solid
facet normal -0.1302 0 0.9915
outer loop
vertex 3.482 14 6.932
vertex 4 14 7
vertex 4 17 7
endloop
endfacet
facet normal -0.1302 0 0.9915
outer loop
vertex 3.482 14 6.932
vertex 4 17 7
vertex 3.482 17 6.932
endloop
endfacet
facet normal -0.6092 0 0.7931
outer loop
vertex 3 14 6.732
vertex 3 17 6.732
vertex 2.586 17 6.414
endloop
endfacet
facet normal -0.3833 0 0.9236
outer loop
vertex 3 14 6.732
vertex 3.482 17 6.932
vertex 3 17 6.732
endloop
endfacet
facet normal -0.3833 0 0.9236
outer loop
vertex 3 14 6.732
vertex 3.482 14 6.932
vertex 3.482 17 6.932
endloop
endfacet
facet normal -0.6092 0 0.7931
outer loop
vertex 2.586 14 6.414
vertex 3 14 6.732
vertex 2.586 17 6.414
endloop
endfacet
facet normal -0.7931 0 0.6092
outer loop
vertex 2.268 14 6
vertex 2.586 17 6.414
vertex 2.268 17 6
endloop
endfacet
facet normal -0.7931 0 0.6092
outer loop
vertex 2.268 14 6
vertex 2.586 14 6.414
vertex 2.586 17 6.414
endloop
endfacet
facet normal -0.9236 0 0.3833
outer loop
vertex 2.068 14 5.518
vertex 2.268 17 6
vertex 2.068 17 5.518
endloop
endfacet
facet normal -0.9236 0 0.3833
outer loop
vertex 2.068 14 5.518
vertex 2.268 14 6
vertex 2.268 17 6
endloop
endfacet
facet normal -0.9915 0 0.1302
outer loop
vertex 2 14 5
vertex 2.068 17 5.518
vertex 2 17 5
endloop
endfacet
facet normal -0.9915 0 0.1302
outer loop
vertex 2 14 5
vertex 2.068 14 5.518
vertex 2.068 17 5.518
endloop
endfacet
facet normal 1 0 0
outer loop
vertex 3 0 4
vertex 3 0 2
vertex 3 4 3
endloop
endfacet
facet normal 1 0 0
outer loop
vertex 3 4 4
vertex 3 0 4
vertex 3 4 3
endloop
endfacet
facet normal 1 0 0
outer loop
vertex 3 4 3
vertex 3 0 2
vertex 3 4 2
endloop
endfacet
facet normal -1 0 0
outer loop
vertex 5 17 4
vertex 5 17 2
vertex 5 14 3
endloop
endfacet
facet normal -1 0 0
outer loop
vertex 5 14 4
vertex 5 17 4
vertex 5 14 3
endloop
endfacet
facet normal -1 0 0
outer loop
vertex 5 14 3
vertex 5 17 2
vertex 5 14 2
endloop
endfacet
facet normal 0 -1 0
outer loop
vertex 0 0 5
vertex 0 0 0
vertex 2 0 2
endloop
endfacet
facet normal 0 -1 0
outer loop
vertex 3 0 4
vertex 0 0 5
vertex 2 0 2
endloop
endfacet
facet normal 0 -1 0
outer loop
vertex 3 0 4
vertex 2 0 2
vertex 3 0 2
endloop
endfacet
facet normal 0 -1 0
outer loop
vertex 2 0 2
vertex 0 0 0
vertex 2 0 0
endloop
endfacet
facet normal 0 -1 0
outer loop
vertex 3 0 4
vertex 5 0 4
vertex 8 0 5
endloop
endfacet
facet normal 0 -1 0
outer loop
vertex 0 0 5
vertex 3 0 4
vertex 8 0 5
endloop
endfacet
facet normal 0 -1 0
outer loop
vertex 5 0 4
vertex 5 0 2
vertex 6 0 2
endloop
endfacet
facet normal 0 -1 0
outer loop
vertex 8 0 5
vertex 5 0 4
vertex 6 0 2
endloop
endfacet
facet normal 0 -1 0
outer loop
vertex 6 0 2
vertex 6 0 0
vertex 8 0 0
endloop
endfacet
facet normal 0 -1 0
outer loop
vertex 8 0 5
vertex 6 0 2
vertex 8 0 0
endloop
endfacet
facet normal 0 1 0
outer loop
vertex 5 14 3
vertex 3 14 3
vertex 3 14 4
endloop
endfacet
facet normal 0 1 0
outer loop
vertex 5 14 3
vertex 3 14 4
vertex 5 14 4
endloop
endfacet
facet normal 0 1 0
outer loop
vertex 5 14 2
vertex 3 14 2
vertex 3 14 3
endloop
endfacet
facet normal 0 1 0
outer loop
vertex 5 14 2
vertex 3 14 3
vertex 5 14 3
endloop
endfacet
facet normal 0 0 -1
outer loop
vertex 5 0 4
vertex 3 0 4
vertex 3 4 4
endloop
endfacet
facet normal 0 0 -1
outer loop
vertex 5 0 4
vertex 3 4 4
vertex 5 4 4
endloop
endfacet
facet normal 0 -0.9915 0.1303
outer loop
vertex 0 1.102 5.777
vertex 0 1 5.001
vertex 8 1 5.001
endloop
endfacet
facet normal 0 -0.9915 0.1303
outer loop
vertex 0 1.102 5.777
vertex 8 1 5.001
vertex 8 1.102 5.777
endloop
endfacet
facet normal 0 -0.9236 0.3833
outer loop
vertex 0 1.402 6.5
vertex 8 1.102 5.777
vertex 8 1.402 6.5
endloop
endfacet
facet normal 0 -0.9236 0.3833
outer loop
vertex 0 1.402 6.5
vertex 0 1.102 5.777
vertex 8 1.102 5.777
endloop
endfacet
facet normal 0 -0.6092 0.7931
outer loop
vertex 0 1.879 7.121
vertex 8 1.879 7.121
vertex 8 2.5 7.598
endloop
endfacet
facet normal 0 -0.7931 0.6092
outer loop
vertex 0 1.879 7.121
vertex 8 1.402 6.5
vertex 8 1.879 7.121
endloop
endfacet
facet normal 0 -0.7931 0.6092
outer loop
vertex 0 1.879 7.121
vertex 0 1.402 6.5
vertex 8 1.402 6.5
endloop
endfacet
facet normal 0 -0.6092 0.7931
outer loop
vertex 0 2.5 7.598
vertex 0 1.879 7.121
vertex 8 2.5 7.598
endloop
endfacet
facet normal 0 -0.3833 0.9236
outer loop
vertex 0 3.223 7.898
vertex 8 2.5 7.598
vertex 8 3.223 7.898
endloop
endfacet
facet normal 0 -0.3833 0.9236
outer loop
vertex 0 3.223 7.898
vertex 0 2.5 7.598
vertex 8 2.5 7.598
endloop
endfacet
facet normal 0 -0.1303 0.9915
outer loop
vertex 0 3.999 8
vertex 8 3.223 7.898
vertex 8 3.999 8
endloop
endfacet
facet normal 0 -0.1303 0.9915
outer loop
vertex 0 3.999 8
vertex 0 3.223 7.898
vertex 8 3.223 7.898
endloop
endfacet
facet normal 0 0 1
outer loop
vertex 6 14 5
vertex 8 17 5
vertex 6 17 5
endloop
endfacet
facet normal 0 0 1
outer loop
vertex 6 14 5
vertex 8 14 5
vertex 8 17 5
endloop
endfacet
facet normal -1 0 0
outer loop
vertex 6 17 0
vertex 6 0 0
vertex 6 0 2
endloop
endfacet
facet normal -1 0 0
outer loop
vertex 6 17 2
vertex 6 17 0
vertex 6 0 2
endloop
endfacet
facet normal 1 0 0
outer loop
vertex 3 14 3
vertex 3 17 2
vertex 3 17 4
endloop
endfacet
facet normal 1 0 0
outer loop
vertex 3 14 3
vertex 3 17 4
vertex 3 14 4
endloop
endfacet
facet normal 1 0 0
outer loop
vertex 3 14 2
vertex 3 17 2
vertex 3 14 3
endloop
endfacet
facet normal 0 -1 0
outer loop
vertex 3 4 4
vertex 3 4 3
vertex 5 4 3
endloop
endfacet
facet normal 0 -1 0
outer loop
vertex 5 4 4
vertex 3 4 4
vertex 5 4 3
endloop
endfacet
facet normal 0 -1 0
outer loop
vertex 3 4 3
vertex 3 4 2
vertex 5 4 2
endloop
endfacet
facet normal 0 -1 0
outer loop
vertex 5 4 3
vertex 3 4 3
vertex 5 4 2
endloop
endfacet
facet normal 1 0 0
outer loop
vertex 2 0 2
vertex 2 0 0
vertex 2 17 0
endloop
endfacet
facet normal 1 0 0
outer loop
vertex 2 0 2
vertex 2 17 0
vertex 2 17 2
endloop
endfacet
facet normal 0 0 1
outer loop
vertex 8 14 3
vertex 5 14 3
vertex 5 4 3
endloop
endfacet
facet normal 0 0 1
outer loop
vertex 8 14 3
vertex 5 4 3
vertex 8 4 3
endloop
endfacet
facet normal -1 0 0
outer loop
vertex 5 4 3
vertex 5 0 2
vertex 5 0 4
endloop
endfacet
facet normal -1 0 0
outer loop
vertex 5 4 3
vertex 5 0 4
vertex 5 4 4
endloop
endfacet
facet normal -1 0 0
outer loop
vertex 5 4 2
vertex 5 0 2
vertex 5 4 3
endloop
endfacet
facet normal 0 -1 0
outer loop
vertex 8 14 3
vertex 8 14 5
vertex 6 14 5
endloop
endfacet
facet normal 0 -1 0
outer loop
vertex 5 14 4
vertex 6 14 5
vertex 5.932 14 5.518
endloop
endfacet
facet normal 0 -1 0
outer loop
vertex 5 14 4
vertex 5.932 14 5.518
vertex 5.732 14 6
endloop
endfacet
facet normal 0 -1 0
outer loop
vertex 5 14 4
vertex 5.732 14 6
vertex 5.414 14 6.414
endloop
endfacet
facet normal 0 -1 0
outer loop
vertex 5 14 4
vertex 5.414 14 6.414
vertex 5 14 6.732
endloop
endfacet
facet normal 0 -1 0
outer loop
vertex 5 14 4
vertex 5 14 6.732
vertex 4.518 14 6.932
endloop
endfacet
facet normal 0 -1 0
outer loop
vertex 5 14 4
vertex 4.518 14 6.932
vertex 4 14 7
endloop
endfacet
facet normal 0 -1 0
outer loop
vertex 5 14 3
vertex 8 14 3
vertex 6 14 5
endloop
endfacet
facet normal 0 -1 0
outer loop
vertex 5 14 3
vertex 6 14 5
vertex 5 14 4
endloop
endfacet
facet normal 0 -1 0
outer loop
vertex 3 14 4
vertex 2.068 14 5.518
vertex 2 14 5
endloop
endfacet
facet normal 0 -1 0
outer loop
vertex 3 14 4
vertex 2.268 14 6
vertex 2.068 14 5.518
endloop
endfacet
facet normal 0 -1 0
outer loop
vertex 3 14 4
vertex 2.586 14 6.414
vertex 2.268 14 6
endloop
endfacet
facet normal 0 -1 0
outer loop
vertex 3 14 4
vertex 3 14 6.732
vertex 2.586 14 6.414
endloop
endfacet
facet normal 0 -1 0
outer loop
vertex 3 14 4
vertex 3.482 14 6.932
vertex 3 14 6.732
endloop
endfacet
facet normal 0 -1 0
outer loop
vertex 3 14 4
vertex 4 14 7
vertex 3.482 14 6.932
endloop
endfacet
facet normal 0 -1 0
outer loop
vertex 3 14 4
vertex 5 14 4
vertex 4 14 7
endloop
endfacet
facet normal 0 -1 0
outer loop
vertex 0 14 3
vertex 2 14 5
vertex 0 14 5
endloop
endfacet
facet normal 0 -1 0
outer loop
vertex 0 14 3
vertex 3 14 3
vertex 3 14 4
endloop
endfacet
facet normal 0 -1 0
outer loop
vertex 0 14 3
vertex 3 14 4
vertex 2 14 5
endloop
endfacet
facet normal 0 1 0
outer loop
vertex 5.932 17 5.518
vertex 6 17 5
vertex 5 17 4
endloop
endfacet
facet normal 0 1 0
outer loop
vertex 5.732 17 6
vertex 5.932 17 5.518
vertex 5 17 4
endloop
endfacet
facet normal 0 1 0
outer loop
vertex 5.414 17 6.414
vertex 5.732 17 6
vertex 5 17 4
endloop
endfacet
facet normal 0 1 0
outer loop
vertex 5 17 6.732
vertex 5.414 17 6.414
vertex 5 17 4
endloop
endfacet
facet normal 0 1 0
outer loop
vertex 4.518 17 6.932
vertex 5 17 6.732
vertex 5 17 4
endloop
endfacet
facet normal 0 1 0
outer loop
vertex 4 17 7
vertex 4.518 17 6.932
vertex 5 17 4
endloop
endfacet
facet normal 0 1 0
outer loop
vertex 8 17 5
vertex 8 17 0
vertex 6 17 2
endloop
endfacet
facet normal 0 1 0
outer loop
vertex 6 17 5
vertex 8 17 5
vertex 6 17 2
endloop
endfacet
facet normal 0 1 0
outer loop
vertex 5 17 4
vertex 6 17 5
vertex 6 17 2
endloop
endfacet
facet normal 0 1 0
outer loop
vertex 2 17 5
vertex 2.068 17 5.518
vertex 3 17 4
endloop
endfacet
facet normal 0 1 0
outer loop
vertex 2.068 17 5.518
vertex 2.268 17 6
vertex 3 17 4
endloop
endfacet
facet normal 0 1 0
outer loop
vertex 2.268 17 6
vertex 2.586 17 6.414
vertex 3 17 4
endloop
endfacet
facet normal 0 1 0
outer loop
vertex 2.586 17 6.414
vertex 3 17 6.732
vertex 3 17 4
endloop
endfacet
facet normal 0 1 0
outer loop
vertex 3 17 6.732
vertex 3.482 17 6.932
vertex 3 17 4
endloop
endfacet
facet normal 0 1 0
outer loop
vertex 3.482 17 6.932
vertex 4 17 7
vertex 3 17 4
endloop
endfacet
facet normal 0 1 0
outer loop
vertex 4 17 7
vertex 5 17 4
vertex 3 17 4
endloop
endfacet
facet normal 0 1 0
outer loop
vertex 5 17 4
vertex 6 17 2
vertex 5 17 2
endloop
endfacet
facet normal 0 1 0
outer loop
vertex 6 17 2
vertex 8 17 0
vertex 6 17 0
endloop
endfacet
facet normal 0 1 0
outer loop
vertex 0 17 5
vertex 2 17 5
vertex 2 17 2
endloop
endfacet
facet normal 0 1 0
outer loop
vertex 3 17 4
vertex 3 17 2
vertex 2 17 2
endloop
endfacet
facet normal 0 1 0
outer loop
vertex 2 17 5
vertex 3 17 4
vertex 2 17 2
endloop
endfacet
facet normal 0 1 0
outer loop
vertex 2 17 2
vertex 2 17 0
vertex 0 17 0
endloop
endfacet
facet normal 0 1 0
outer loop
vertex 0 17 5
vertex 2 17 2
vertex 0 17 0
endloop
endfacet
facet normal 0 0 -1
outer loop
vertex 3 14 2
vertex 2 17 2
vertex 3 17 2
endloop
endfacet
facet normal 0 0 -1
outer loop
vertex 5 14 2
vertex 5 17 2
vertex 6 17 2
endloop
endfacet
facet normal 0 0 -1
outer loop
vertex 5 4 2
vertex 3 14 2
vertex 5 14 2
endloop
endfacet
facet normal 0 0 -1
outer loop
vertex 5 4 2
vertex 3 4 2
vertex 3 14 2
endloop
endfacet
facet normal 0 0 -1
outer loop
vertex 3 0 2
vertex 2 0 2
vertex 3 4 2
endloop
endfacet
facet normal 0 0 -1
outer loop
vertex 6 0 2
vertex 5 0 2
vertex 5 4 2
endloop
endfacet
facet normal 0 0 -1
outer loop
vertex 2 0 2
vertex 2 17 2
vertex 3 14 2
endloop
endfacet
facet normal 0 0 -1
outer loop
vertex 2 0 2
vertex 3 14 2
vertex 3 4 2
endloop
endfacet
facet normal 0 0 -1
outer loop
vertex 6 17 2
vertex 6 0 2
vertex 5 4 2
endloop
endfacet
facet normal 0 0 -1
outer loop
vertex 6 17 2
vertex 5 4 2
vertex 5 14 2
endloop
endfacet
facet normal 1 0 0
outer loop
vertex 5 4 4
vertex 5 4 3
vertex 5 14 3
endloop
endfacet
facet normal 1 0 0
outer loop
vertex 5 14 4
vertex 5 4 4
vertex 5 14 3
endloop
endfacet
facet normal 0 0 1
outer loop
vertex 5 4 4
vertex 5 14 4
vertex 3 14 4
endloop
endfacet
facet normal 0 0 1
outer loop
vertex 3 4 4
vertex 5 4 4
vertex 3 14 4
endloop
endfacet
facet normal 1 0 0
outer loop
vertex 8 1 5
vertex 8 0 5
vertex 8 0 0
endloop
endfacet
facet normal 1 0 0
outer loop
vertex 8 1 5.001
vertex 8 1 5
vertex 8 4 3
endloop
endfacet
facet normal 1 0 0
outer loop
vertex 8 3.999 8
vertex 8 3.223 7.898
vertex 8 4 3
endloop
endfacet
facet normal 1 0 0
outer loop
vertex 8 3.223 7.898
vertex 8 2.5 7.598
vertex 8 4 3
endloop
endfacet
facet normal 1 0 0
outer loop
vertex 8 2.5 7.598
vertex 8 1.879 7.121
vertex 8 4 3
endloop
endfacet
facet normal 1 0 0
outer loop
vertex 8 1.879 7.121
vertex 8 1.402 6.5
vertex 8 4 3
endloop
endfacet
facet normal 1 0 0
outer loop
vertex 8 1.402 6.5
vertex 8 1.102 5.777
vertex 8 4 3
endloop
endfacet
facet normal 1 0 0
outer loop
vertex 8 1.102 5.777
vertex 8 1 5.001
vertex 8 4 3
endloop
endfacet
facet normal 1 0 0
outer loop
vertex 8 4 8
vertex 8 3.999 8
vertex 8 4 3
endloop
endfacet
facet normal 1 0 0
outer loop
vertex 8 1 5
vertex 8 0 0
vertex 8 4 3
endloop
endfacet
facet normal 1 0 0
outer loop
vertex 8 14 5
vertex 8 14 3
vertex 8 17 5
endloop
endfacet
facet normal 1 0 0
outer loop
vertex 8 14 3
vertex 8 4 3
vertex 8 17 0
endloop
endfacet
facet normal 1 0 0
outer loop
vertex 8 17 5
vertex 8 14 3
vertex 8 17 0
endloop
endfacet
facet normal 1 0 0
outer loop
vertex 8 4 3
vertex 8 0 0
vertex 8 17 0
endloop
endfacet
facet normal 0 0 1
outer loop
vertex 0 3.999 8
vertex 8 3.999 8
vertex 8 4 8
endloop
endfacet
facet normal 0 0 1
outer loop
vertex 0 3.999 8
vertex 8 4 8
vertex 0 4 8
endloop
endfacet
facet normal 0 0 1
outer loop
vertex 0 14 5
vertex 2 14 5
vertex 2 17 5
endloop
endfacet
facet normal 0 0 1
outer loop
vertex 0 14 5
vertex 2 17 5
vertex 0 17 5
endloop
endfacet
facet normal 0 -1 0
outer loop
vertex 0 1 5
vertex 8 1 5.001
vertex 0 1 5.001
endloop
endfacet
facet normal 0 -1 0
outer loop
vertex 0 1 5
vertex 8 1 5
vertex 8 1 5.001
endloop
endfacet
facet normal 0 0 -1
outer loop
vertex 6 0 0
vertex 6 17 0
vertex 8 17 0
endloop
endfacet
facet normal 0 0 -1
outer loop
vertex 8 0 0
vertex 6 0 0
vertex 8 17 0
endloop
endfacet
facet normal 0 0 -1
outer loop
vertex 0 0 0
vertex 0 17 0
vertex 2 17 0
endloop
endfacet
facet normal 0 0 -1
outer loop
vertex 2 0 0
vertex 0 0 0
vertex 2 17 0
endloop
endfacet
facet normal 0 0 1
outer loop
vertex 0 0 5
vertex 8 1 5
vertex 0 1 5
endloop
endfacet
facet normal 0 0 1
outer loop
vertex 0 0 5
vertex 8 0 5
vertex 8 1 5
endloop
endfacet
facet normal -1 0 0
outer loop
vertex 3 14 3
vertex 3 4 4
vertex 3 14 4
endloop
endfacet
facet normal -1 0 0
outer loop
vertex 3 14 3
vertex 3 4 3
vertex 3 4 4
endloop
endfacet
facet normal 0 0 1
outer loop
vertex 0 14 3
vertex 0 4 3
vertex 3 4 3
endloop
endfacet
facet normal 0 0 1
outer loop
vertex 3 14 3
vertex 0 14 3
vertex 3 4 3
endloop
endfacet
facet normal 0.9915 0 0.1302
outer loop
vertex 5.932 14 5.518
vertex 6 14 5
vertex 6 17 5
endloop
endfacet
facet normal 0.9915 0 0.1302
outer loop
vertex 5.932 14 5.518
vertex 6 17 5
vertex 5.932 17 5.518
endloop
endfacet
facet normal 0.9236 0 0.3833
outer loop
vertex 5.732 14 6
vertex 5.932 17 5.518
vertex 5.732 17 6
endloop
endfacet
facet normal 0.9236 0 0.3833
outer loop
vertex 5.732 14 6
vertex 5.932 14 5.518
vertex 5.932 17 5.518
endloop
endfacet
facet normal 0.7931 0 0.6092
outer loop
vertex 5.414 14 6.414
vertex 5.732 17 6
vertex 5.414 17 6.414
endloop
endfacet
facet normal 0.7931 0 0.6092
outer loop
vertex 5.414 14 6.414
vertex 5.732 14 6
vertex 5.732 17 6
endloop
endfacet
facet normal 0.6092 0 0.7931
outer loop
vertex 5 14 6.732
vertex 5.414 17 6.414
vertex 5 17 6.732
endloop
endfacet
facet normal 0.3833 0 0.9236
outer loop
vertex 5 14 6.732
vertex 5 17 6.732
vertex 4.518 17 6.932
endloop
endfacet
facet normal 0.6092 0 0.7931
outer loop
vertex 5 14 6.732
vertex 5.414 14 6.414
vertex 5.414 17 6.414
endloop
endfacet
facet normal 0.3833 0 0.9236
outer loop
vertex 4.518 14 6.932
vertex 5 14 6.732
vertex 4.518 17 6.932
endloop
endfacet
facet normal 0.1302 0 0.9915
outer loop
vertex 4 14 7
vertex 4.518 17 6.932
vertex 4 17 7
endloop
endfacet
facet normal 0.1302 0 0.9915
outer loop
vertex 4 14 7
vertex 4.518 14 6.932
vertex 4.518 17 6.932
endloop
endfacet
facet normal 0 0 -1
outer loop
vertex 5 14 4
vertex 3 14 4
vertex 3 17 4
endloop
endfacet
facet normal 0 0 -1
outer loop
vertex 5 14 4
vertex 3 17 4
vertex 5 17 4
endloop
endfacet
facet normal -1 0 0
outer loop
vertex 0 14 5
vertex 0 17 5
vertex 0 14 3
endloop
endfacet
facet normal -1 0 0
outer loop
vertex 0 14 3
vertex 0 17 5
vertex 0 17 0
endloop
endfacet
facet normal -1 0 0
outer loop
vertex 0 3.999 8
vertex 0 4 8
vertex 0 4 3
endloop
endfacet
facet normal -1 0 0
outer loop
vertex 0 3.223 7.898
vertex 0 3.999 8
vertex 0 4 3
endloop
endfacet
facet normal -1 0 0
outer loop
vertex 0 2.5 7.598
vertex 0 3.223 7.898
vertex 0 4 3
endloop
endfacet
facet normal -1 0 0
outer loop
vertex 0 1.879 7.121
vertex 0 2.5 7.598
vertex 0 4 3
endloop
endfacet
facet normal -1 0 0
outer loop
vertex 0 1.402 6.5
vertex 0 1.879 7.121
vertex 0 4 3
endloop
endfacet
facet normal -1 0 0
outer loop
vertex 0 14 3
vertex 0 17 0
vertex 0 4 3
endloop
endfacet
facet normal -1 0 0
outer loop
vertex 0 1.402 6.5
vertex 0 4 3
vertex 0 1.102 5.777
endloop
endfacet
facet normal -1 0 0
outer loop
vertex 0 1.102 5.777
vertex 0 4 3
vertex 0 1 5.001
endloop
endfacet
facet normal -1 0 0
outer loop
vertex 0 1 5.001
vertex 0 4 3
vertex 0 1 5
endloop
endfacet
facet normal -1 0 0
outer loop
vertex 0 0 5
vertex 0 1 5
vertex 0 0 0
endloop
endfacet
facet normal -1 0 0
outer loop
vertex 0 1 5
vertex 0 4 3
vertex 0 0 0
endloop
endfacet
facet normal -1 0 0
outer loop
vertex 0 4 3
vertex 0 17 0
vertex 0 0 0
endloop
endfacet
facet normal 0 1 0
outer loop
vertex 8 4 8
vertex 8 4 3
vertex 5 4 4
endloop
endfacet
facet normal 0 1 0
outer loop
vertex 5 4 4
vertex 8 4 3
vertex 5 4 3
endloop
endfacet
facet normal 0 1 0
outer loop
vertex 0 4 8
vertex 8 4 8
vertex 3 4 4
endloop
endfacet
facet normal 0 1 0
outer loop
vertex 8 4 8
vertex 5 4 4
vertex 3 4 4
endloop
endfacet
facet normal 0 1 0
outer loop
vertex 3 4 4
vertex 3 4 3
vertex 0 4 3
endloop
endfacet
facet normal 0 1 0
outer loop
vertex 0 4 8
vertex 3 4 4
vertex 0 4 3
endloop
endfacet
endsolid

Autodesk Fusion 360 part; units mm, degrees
sketch "Sketch1" plane through (0, 0, 0) normal (0, 0, 1) x (1, 0, 0)
  line L0 (0, 0) -> (8, 0)
  line L1 (8, 0) -> (8, 17)
  line L2 (8, 17) -> (0, 17)
  line L3 (0, 17) -> (0, 0)
  dimension "d1" = 8
  dimension "d2" = 17
extrude "Extrude1" add sketch "Sketch1" along normal blind 3
sketch "Sketch2" plane through (0, 0, 3) normal (0, 0, 1) x (-1, 0, 0)
  line L0 (0, -17) -> (0, 0)
  line L1 (0, 0) -> (-8, 0)
  line L2 (-8, 0) -> (-8, -17)
  line L3 (-8, -17) -> (0, -17)
  line L4 (0, 0) -> (-8, 0)
  line L5 (-8, 0) -> (-8, -4)
  line L6 (-8, -4) -> (0, -4)
  line L7 (0, -4) -> (0, 0)
  dimension "d5" = 8
  dimension "d6" = 4
extrude "Extrude2" add sketch "Sketch2" along normal blind 2 contours L0 L1 L2 L4 L5 L6 L7
sketch "Sketch3" plane through (0, 0, 5) normal (0, 0, 1) x (-1, 0, 0)
  line L0 (0, -4) -> (0, 0)
  line L1 (0, 0) -> (-8, 0)
  line L2 (-8, 0) -> (-8, -4)
  line L3 (-8, -4) -> (0, -4)
  line L4 (0, 0) -> (-8, 0)
  line L5 (-8, 0) -> (-8, -1)
  line L6 (-8, -1) -> (0, -1)
  line L7 (0, -1) -> (0, 0)
  dimension "d9" = 8
extrude "Extrude3" add sketch "Sketch3" along normal blind 3 contours L0 L2 L3 L6
fillet "Fillet1" radius 3 1 edges at (4, 1, 8)
sketch "Sketch4" plane through (0, 0, 3) normal (0, 0, 1) x (-1, 0, 0)
  line L0 (0, -4) -> (-8, -4)
  line L1 (-8, -4) -> (-8, -17)
  line L2 (-8, -17) -> (0, -17)
  line L3 (0, -17) -> (0, -4)
  line L4 (0, -17) -> (-8, -17)
  line L5 (-8, -17) -> (-8, -14)
  line L6 (-8, -14) -> (0, -14)
  line L7 (0, -14) -> (0, -17)
  dimension "d14" = 3
extrude "Extrude4" add sketch "Sketch4" along normal blind 2 contours L1 L2 L3 L4 L5 L6 L7
sketch "Sketch5" plane through (0, 0, 5) normal (0, 0, 1) x (-1, 0, 0)
  line L0 (0, -14) -> (-8, -14)
  line L1 (-8, -14) -> (-8, -17)
  line L2 (-8, -17) -> (0, -17)
  line L3 (0, -17) -> (0, -14)
  line L4 (-8, -17) -> (-6, -17)
  line L5 (-6, -17) -> (-6, -14)
  line L6 (-6, -14) -> (-8, -14)
  line L7 (-8, -14) -> (-8, -17)
  line L8 (0, -17) -> (-2, -17)
  line L9 (-2, -17) -> (-2, -14)
  line L10 (-2, -14) -> (0, -14)
  line L11 (0, -14) -> (0, -17)
  dimension "d17" = 2
  dimension "d18" = 2
extrude "Extrude5" add sketch "Sketch5" along normal blind 2 contours L0 L2 L5 L9
fillet "Fillet2" radius 2 2 edges at (2, 15.5, 7) (6, 15.5, 7)
sketch "Sketch6" plane through (0, 0, 0) normal (0, -1, 0) x (1, 0, 0)
  line L0 (0, 0) -> (8, 0)
  line L1 (8, 0) -> (8, 5)
  line L2 (8, 5) -> (0, 5)
  line L3 (0, 5) -> (0, 0)
  line L4 (0, 0) -> (2, 0)
  line L5 (2, 0) -> (2, 2)
  line L6 (2, 2) -> (0, 2)
  line L7 (0, 2) -> (0, 0)
  line L8 (8, 0) -> (6, 0)
  line L9 (6, 0) -> (6, 2)
  line L10 (6, 2) -> (8, 2)
  line L11 (8, 2) -> (8, 0)
  line L12 (2, 2) -> (6, 2)
  line L13 (6, 2) -> (6, 0)
  line L14 (6, 0) -> (2, 0)
  line L15 (2, 0) -> (2, 2)
  dimension "d23" = 2
  dimension "d24" = 2
  dimension "d25" = 2
extrude "Extrude6" cut sketch "Sketch6" against normal blind 23 contours L0 L5 L9 L12 L13 L14 L15
sketch "Sketch7" plane through (0, 0, 3) normal (0, 0, 1) x (-1, 0, 0)
  line L0 (-8, -14) -> (0, -14)
  line L1 (0, -14) -> (0, -4)
  line L2 (0, -4) -> (-8, -4)
  line L3 (-8, -4) -> (-8, -14)
  line L4 (0, -4) -> (-3, -4)
  line L5 (-3, -4) -> (-3, -14)
  line L6 (-3, -14) -> (0, -14)
  line L7 (0, -14) -> (0, -4)
  line L8 (-8, -4) -> (-5, -4)
  line L9 (-5, -4) -> (-5, -14)
  line L10 (-5, -14) -> (-8, -14)
  line L11 (-8, -14) -> (-8, -4)
  dimension "d28" = 3
  dimension "d29" = 3
extrude "Extrude7" add sketch "Sketch7" along normal blind 1 contours L0 L2 L5 L9
sketch "Sketch8" plane through (0, 0, 2) normal (0, 0, -1) x (1, 0, 0)
  line L0 (2, -17) -> (6, -17)
  line L1 (6, -17) -> (6, 0)
  line L2 (6, 0) -> (2, 0)
  line L3 (2, 0) -> (2, -17)
  line L4 (6, 0) -> (2, 0)
  line L5 (2, 0) -> (2, -4)
  line L6 (2, -4) -> (6, -4)
  line L7 (6, -4) -> (6, 0)
  line L8 (6, 0) -> (5, 0)
  line L9 (5, 0) -> (5, -4)
  line L10 (5, -4) -> (6, -4)
  line L11 (6, -4) -> (6, 0)
  line L12 (2, 0) -> (3, 0)
  line L13 (3, 0) -> (3, -4)
  line L14 (3, -4) -> (2, -4)
  line L15 (2, -4) -> (2, 0)
  line L16 (6, -17) -> (2, -17)
  line L17 (2, -17) -> (2, -14)
  line L18 (2, -14) -> (6, -14)
  line L19 (6, -14) -> (6, -17)
  line L20 (6, -17) -> (5, -17)
  line L21 (5, -17) -> (5, -14)
  line L22 (5, -14) -> (6, -14)
  line L23 (6, -14) -> (6, -17)
  line L24 (2, -17) -> (3, -17)
  line L25 (3, -17) -> (3, -14)
  line L26 (3, -14) -> (2, -14)
  line L27 (2, -14) -> (2, -17)
  dimension "d32" = 4
  dimension "d33" = 1
  dimension "d34" = 1
  dimension "d35" = 3
  dimension "d36" = 1
  dimension "d37" = 1
extrude "Extrude8" cut sketch "Sketch8" against normal blind 2 contours L0 L16 L18 L21 L25 | L2 L4 L6 L9 L13
